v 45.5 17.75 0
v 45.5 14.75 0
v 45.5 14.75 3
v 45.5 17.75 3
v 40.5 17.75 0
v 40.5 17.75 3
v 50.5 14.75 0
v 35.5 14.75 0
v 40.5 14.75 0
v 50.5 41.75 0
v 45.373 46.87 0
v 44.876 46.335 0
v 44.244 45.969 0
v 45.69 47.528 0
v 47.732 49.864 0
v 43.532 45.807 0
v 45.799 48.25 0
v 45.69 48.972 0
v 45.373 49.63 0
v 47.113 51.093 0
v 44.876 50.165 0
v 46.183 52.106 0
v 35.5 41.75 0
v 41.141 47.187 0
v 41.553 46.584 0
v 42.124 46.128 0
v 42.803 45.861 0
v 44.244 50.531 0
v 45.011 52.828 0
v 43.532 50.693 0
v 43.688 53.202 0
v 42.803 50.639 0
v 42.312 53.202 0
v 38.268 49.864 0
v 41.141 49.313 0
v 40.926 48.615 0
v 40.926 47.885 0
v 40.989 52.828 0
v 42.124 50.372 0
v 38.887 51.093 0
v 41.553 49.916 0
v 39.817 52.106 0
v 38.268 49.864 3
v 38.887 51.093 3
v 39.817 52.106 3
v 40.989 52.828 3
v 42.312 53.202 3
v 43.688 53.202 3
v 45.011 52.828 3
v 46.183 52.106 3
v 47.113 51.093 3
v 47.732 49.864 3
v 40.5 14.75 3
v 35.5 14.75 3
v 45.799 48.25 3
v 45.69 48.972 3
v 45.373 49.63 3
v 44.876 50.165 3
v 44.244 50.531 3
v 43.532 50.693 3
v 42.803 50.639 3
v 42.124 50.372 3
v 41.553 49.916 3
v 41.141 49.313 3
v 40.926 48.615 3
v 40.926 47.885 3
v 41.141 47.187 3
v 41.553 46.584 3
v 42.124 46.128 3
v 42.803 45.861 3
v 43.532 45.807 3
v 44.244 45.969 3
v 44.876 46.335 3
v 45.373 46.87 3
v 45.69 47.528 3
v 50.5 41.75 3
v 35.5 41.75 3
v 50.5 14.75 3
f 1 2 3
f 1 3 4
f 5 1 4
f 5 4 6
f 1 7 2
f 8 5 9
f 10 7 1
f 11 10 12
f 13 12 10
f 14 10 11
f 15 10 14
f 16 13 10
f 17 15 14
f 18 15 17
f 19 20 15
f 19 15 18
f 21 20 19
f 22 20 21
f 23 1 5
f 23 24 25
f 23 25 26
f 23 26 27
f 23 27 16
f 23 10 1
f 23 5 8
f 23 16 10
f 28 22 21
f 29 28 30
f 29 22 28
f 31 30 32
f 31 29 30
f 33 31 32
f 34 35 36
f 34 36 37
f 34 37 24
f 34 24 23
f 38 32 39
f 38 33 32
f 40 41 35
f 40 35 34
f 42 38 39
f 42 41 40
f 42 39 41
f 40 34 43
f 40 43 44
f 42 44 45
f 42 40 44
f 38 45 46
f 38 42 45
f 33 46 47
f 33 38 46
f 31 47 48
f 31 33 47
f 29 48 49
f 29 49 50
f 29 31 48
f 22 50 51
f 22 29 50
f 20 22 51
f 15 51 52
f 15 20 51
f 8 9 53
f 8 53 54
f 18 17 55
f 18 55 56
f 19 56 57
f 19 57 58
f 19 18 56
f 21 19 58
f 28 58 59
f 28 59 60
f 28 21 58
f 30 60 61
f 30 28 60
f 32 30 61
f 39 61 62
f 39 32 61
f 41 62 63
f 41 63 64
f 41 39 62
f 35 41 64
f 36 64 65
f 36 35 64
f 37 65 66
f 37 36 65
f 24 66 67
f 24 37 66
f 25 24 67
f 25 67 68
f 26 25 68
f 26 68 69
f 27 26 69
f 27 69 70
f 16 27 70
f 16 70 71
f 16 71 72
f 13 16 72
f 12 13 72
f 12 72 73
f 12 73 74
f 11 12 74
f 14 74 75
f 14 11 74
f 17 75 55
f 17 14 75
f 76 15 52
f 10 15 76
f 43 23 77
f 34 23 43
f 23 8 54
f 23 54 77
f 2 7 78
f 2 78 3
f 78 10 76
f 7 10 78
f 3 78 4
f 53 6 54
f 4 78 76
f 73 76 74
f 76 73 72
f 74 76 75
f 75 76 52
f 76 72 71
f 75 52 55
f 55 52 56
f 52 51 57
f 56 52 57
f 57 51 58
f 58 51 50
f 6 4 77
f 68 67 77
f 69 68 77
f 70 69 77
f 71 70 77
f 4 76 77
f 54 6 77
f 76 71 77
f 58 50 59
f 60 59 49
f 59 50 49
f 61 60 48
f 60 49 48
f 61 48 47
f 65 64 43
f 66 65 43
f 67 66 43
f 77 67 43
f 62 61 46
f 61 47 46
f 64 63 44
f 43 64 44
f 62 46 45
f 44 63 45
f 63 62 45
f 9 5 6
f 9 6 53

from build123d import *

# Parameters (mm, degrees)
MODEL_R                 = 2.45
SALIENTE_EXTRUIR1_DEPTH = 3


with BuildPart() as part:
    # Model → Saliente-Extruir1 (new body)
    with BuildSketch(Plane.XY):
        with BuildLine():
            Line((47.732278764, 49.864167804), (50.5, 41.75))
            Line((50.5, 41.75), (50.5, 27.75))
            Line((50.5, 27.75), (50.5, 14.75))
            Line((50.5, 14.75), (45.5, 14.75))
            Line((45.5, 14.75), (45.5, 17.75))
            Line((45.5, 17.75), (40.5, 17.75))
            Line((40.5, 17.75), (40.5, 14.75))
            Line((40.5, 14.75), (35.5, 14.75))
            Line((35.5, 14.75), (35.5, 27.75))
            Line((35.5, 27.75), (35.5, 41.75))
            Line((35.5, 41.75), (38.267721236, 49.864167804))
            ThreePointArc((38.267721236, 49.864167804), (43, 53.25), (47.732278764, 49.864167804))
        make_face()
        with Locations((43.348582377, 48.25)):
            Circle(MODEL_R, mode=Mode.SUBTRACT)
    extrude(amount=SALIENTE_EXTRUIR1_DEPTH)


solid = part.part
